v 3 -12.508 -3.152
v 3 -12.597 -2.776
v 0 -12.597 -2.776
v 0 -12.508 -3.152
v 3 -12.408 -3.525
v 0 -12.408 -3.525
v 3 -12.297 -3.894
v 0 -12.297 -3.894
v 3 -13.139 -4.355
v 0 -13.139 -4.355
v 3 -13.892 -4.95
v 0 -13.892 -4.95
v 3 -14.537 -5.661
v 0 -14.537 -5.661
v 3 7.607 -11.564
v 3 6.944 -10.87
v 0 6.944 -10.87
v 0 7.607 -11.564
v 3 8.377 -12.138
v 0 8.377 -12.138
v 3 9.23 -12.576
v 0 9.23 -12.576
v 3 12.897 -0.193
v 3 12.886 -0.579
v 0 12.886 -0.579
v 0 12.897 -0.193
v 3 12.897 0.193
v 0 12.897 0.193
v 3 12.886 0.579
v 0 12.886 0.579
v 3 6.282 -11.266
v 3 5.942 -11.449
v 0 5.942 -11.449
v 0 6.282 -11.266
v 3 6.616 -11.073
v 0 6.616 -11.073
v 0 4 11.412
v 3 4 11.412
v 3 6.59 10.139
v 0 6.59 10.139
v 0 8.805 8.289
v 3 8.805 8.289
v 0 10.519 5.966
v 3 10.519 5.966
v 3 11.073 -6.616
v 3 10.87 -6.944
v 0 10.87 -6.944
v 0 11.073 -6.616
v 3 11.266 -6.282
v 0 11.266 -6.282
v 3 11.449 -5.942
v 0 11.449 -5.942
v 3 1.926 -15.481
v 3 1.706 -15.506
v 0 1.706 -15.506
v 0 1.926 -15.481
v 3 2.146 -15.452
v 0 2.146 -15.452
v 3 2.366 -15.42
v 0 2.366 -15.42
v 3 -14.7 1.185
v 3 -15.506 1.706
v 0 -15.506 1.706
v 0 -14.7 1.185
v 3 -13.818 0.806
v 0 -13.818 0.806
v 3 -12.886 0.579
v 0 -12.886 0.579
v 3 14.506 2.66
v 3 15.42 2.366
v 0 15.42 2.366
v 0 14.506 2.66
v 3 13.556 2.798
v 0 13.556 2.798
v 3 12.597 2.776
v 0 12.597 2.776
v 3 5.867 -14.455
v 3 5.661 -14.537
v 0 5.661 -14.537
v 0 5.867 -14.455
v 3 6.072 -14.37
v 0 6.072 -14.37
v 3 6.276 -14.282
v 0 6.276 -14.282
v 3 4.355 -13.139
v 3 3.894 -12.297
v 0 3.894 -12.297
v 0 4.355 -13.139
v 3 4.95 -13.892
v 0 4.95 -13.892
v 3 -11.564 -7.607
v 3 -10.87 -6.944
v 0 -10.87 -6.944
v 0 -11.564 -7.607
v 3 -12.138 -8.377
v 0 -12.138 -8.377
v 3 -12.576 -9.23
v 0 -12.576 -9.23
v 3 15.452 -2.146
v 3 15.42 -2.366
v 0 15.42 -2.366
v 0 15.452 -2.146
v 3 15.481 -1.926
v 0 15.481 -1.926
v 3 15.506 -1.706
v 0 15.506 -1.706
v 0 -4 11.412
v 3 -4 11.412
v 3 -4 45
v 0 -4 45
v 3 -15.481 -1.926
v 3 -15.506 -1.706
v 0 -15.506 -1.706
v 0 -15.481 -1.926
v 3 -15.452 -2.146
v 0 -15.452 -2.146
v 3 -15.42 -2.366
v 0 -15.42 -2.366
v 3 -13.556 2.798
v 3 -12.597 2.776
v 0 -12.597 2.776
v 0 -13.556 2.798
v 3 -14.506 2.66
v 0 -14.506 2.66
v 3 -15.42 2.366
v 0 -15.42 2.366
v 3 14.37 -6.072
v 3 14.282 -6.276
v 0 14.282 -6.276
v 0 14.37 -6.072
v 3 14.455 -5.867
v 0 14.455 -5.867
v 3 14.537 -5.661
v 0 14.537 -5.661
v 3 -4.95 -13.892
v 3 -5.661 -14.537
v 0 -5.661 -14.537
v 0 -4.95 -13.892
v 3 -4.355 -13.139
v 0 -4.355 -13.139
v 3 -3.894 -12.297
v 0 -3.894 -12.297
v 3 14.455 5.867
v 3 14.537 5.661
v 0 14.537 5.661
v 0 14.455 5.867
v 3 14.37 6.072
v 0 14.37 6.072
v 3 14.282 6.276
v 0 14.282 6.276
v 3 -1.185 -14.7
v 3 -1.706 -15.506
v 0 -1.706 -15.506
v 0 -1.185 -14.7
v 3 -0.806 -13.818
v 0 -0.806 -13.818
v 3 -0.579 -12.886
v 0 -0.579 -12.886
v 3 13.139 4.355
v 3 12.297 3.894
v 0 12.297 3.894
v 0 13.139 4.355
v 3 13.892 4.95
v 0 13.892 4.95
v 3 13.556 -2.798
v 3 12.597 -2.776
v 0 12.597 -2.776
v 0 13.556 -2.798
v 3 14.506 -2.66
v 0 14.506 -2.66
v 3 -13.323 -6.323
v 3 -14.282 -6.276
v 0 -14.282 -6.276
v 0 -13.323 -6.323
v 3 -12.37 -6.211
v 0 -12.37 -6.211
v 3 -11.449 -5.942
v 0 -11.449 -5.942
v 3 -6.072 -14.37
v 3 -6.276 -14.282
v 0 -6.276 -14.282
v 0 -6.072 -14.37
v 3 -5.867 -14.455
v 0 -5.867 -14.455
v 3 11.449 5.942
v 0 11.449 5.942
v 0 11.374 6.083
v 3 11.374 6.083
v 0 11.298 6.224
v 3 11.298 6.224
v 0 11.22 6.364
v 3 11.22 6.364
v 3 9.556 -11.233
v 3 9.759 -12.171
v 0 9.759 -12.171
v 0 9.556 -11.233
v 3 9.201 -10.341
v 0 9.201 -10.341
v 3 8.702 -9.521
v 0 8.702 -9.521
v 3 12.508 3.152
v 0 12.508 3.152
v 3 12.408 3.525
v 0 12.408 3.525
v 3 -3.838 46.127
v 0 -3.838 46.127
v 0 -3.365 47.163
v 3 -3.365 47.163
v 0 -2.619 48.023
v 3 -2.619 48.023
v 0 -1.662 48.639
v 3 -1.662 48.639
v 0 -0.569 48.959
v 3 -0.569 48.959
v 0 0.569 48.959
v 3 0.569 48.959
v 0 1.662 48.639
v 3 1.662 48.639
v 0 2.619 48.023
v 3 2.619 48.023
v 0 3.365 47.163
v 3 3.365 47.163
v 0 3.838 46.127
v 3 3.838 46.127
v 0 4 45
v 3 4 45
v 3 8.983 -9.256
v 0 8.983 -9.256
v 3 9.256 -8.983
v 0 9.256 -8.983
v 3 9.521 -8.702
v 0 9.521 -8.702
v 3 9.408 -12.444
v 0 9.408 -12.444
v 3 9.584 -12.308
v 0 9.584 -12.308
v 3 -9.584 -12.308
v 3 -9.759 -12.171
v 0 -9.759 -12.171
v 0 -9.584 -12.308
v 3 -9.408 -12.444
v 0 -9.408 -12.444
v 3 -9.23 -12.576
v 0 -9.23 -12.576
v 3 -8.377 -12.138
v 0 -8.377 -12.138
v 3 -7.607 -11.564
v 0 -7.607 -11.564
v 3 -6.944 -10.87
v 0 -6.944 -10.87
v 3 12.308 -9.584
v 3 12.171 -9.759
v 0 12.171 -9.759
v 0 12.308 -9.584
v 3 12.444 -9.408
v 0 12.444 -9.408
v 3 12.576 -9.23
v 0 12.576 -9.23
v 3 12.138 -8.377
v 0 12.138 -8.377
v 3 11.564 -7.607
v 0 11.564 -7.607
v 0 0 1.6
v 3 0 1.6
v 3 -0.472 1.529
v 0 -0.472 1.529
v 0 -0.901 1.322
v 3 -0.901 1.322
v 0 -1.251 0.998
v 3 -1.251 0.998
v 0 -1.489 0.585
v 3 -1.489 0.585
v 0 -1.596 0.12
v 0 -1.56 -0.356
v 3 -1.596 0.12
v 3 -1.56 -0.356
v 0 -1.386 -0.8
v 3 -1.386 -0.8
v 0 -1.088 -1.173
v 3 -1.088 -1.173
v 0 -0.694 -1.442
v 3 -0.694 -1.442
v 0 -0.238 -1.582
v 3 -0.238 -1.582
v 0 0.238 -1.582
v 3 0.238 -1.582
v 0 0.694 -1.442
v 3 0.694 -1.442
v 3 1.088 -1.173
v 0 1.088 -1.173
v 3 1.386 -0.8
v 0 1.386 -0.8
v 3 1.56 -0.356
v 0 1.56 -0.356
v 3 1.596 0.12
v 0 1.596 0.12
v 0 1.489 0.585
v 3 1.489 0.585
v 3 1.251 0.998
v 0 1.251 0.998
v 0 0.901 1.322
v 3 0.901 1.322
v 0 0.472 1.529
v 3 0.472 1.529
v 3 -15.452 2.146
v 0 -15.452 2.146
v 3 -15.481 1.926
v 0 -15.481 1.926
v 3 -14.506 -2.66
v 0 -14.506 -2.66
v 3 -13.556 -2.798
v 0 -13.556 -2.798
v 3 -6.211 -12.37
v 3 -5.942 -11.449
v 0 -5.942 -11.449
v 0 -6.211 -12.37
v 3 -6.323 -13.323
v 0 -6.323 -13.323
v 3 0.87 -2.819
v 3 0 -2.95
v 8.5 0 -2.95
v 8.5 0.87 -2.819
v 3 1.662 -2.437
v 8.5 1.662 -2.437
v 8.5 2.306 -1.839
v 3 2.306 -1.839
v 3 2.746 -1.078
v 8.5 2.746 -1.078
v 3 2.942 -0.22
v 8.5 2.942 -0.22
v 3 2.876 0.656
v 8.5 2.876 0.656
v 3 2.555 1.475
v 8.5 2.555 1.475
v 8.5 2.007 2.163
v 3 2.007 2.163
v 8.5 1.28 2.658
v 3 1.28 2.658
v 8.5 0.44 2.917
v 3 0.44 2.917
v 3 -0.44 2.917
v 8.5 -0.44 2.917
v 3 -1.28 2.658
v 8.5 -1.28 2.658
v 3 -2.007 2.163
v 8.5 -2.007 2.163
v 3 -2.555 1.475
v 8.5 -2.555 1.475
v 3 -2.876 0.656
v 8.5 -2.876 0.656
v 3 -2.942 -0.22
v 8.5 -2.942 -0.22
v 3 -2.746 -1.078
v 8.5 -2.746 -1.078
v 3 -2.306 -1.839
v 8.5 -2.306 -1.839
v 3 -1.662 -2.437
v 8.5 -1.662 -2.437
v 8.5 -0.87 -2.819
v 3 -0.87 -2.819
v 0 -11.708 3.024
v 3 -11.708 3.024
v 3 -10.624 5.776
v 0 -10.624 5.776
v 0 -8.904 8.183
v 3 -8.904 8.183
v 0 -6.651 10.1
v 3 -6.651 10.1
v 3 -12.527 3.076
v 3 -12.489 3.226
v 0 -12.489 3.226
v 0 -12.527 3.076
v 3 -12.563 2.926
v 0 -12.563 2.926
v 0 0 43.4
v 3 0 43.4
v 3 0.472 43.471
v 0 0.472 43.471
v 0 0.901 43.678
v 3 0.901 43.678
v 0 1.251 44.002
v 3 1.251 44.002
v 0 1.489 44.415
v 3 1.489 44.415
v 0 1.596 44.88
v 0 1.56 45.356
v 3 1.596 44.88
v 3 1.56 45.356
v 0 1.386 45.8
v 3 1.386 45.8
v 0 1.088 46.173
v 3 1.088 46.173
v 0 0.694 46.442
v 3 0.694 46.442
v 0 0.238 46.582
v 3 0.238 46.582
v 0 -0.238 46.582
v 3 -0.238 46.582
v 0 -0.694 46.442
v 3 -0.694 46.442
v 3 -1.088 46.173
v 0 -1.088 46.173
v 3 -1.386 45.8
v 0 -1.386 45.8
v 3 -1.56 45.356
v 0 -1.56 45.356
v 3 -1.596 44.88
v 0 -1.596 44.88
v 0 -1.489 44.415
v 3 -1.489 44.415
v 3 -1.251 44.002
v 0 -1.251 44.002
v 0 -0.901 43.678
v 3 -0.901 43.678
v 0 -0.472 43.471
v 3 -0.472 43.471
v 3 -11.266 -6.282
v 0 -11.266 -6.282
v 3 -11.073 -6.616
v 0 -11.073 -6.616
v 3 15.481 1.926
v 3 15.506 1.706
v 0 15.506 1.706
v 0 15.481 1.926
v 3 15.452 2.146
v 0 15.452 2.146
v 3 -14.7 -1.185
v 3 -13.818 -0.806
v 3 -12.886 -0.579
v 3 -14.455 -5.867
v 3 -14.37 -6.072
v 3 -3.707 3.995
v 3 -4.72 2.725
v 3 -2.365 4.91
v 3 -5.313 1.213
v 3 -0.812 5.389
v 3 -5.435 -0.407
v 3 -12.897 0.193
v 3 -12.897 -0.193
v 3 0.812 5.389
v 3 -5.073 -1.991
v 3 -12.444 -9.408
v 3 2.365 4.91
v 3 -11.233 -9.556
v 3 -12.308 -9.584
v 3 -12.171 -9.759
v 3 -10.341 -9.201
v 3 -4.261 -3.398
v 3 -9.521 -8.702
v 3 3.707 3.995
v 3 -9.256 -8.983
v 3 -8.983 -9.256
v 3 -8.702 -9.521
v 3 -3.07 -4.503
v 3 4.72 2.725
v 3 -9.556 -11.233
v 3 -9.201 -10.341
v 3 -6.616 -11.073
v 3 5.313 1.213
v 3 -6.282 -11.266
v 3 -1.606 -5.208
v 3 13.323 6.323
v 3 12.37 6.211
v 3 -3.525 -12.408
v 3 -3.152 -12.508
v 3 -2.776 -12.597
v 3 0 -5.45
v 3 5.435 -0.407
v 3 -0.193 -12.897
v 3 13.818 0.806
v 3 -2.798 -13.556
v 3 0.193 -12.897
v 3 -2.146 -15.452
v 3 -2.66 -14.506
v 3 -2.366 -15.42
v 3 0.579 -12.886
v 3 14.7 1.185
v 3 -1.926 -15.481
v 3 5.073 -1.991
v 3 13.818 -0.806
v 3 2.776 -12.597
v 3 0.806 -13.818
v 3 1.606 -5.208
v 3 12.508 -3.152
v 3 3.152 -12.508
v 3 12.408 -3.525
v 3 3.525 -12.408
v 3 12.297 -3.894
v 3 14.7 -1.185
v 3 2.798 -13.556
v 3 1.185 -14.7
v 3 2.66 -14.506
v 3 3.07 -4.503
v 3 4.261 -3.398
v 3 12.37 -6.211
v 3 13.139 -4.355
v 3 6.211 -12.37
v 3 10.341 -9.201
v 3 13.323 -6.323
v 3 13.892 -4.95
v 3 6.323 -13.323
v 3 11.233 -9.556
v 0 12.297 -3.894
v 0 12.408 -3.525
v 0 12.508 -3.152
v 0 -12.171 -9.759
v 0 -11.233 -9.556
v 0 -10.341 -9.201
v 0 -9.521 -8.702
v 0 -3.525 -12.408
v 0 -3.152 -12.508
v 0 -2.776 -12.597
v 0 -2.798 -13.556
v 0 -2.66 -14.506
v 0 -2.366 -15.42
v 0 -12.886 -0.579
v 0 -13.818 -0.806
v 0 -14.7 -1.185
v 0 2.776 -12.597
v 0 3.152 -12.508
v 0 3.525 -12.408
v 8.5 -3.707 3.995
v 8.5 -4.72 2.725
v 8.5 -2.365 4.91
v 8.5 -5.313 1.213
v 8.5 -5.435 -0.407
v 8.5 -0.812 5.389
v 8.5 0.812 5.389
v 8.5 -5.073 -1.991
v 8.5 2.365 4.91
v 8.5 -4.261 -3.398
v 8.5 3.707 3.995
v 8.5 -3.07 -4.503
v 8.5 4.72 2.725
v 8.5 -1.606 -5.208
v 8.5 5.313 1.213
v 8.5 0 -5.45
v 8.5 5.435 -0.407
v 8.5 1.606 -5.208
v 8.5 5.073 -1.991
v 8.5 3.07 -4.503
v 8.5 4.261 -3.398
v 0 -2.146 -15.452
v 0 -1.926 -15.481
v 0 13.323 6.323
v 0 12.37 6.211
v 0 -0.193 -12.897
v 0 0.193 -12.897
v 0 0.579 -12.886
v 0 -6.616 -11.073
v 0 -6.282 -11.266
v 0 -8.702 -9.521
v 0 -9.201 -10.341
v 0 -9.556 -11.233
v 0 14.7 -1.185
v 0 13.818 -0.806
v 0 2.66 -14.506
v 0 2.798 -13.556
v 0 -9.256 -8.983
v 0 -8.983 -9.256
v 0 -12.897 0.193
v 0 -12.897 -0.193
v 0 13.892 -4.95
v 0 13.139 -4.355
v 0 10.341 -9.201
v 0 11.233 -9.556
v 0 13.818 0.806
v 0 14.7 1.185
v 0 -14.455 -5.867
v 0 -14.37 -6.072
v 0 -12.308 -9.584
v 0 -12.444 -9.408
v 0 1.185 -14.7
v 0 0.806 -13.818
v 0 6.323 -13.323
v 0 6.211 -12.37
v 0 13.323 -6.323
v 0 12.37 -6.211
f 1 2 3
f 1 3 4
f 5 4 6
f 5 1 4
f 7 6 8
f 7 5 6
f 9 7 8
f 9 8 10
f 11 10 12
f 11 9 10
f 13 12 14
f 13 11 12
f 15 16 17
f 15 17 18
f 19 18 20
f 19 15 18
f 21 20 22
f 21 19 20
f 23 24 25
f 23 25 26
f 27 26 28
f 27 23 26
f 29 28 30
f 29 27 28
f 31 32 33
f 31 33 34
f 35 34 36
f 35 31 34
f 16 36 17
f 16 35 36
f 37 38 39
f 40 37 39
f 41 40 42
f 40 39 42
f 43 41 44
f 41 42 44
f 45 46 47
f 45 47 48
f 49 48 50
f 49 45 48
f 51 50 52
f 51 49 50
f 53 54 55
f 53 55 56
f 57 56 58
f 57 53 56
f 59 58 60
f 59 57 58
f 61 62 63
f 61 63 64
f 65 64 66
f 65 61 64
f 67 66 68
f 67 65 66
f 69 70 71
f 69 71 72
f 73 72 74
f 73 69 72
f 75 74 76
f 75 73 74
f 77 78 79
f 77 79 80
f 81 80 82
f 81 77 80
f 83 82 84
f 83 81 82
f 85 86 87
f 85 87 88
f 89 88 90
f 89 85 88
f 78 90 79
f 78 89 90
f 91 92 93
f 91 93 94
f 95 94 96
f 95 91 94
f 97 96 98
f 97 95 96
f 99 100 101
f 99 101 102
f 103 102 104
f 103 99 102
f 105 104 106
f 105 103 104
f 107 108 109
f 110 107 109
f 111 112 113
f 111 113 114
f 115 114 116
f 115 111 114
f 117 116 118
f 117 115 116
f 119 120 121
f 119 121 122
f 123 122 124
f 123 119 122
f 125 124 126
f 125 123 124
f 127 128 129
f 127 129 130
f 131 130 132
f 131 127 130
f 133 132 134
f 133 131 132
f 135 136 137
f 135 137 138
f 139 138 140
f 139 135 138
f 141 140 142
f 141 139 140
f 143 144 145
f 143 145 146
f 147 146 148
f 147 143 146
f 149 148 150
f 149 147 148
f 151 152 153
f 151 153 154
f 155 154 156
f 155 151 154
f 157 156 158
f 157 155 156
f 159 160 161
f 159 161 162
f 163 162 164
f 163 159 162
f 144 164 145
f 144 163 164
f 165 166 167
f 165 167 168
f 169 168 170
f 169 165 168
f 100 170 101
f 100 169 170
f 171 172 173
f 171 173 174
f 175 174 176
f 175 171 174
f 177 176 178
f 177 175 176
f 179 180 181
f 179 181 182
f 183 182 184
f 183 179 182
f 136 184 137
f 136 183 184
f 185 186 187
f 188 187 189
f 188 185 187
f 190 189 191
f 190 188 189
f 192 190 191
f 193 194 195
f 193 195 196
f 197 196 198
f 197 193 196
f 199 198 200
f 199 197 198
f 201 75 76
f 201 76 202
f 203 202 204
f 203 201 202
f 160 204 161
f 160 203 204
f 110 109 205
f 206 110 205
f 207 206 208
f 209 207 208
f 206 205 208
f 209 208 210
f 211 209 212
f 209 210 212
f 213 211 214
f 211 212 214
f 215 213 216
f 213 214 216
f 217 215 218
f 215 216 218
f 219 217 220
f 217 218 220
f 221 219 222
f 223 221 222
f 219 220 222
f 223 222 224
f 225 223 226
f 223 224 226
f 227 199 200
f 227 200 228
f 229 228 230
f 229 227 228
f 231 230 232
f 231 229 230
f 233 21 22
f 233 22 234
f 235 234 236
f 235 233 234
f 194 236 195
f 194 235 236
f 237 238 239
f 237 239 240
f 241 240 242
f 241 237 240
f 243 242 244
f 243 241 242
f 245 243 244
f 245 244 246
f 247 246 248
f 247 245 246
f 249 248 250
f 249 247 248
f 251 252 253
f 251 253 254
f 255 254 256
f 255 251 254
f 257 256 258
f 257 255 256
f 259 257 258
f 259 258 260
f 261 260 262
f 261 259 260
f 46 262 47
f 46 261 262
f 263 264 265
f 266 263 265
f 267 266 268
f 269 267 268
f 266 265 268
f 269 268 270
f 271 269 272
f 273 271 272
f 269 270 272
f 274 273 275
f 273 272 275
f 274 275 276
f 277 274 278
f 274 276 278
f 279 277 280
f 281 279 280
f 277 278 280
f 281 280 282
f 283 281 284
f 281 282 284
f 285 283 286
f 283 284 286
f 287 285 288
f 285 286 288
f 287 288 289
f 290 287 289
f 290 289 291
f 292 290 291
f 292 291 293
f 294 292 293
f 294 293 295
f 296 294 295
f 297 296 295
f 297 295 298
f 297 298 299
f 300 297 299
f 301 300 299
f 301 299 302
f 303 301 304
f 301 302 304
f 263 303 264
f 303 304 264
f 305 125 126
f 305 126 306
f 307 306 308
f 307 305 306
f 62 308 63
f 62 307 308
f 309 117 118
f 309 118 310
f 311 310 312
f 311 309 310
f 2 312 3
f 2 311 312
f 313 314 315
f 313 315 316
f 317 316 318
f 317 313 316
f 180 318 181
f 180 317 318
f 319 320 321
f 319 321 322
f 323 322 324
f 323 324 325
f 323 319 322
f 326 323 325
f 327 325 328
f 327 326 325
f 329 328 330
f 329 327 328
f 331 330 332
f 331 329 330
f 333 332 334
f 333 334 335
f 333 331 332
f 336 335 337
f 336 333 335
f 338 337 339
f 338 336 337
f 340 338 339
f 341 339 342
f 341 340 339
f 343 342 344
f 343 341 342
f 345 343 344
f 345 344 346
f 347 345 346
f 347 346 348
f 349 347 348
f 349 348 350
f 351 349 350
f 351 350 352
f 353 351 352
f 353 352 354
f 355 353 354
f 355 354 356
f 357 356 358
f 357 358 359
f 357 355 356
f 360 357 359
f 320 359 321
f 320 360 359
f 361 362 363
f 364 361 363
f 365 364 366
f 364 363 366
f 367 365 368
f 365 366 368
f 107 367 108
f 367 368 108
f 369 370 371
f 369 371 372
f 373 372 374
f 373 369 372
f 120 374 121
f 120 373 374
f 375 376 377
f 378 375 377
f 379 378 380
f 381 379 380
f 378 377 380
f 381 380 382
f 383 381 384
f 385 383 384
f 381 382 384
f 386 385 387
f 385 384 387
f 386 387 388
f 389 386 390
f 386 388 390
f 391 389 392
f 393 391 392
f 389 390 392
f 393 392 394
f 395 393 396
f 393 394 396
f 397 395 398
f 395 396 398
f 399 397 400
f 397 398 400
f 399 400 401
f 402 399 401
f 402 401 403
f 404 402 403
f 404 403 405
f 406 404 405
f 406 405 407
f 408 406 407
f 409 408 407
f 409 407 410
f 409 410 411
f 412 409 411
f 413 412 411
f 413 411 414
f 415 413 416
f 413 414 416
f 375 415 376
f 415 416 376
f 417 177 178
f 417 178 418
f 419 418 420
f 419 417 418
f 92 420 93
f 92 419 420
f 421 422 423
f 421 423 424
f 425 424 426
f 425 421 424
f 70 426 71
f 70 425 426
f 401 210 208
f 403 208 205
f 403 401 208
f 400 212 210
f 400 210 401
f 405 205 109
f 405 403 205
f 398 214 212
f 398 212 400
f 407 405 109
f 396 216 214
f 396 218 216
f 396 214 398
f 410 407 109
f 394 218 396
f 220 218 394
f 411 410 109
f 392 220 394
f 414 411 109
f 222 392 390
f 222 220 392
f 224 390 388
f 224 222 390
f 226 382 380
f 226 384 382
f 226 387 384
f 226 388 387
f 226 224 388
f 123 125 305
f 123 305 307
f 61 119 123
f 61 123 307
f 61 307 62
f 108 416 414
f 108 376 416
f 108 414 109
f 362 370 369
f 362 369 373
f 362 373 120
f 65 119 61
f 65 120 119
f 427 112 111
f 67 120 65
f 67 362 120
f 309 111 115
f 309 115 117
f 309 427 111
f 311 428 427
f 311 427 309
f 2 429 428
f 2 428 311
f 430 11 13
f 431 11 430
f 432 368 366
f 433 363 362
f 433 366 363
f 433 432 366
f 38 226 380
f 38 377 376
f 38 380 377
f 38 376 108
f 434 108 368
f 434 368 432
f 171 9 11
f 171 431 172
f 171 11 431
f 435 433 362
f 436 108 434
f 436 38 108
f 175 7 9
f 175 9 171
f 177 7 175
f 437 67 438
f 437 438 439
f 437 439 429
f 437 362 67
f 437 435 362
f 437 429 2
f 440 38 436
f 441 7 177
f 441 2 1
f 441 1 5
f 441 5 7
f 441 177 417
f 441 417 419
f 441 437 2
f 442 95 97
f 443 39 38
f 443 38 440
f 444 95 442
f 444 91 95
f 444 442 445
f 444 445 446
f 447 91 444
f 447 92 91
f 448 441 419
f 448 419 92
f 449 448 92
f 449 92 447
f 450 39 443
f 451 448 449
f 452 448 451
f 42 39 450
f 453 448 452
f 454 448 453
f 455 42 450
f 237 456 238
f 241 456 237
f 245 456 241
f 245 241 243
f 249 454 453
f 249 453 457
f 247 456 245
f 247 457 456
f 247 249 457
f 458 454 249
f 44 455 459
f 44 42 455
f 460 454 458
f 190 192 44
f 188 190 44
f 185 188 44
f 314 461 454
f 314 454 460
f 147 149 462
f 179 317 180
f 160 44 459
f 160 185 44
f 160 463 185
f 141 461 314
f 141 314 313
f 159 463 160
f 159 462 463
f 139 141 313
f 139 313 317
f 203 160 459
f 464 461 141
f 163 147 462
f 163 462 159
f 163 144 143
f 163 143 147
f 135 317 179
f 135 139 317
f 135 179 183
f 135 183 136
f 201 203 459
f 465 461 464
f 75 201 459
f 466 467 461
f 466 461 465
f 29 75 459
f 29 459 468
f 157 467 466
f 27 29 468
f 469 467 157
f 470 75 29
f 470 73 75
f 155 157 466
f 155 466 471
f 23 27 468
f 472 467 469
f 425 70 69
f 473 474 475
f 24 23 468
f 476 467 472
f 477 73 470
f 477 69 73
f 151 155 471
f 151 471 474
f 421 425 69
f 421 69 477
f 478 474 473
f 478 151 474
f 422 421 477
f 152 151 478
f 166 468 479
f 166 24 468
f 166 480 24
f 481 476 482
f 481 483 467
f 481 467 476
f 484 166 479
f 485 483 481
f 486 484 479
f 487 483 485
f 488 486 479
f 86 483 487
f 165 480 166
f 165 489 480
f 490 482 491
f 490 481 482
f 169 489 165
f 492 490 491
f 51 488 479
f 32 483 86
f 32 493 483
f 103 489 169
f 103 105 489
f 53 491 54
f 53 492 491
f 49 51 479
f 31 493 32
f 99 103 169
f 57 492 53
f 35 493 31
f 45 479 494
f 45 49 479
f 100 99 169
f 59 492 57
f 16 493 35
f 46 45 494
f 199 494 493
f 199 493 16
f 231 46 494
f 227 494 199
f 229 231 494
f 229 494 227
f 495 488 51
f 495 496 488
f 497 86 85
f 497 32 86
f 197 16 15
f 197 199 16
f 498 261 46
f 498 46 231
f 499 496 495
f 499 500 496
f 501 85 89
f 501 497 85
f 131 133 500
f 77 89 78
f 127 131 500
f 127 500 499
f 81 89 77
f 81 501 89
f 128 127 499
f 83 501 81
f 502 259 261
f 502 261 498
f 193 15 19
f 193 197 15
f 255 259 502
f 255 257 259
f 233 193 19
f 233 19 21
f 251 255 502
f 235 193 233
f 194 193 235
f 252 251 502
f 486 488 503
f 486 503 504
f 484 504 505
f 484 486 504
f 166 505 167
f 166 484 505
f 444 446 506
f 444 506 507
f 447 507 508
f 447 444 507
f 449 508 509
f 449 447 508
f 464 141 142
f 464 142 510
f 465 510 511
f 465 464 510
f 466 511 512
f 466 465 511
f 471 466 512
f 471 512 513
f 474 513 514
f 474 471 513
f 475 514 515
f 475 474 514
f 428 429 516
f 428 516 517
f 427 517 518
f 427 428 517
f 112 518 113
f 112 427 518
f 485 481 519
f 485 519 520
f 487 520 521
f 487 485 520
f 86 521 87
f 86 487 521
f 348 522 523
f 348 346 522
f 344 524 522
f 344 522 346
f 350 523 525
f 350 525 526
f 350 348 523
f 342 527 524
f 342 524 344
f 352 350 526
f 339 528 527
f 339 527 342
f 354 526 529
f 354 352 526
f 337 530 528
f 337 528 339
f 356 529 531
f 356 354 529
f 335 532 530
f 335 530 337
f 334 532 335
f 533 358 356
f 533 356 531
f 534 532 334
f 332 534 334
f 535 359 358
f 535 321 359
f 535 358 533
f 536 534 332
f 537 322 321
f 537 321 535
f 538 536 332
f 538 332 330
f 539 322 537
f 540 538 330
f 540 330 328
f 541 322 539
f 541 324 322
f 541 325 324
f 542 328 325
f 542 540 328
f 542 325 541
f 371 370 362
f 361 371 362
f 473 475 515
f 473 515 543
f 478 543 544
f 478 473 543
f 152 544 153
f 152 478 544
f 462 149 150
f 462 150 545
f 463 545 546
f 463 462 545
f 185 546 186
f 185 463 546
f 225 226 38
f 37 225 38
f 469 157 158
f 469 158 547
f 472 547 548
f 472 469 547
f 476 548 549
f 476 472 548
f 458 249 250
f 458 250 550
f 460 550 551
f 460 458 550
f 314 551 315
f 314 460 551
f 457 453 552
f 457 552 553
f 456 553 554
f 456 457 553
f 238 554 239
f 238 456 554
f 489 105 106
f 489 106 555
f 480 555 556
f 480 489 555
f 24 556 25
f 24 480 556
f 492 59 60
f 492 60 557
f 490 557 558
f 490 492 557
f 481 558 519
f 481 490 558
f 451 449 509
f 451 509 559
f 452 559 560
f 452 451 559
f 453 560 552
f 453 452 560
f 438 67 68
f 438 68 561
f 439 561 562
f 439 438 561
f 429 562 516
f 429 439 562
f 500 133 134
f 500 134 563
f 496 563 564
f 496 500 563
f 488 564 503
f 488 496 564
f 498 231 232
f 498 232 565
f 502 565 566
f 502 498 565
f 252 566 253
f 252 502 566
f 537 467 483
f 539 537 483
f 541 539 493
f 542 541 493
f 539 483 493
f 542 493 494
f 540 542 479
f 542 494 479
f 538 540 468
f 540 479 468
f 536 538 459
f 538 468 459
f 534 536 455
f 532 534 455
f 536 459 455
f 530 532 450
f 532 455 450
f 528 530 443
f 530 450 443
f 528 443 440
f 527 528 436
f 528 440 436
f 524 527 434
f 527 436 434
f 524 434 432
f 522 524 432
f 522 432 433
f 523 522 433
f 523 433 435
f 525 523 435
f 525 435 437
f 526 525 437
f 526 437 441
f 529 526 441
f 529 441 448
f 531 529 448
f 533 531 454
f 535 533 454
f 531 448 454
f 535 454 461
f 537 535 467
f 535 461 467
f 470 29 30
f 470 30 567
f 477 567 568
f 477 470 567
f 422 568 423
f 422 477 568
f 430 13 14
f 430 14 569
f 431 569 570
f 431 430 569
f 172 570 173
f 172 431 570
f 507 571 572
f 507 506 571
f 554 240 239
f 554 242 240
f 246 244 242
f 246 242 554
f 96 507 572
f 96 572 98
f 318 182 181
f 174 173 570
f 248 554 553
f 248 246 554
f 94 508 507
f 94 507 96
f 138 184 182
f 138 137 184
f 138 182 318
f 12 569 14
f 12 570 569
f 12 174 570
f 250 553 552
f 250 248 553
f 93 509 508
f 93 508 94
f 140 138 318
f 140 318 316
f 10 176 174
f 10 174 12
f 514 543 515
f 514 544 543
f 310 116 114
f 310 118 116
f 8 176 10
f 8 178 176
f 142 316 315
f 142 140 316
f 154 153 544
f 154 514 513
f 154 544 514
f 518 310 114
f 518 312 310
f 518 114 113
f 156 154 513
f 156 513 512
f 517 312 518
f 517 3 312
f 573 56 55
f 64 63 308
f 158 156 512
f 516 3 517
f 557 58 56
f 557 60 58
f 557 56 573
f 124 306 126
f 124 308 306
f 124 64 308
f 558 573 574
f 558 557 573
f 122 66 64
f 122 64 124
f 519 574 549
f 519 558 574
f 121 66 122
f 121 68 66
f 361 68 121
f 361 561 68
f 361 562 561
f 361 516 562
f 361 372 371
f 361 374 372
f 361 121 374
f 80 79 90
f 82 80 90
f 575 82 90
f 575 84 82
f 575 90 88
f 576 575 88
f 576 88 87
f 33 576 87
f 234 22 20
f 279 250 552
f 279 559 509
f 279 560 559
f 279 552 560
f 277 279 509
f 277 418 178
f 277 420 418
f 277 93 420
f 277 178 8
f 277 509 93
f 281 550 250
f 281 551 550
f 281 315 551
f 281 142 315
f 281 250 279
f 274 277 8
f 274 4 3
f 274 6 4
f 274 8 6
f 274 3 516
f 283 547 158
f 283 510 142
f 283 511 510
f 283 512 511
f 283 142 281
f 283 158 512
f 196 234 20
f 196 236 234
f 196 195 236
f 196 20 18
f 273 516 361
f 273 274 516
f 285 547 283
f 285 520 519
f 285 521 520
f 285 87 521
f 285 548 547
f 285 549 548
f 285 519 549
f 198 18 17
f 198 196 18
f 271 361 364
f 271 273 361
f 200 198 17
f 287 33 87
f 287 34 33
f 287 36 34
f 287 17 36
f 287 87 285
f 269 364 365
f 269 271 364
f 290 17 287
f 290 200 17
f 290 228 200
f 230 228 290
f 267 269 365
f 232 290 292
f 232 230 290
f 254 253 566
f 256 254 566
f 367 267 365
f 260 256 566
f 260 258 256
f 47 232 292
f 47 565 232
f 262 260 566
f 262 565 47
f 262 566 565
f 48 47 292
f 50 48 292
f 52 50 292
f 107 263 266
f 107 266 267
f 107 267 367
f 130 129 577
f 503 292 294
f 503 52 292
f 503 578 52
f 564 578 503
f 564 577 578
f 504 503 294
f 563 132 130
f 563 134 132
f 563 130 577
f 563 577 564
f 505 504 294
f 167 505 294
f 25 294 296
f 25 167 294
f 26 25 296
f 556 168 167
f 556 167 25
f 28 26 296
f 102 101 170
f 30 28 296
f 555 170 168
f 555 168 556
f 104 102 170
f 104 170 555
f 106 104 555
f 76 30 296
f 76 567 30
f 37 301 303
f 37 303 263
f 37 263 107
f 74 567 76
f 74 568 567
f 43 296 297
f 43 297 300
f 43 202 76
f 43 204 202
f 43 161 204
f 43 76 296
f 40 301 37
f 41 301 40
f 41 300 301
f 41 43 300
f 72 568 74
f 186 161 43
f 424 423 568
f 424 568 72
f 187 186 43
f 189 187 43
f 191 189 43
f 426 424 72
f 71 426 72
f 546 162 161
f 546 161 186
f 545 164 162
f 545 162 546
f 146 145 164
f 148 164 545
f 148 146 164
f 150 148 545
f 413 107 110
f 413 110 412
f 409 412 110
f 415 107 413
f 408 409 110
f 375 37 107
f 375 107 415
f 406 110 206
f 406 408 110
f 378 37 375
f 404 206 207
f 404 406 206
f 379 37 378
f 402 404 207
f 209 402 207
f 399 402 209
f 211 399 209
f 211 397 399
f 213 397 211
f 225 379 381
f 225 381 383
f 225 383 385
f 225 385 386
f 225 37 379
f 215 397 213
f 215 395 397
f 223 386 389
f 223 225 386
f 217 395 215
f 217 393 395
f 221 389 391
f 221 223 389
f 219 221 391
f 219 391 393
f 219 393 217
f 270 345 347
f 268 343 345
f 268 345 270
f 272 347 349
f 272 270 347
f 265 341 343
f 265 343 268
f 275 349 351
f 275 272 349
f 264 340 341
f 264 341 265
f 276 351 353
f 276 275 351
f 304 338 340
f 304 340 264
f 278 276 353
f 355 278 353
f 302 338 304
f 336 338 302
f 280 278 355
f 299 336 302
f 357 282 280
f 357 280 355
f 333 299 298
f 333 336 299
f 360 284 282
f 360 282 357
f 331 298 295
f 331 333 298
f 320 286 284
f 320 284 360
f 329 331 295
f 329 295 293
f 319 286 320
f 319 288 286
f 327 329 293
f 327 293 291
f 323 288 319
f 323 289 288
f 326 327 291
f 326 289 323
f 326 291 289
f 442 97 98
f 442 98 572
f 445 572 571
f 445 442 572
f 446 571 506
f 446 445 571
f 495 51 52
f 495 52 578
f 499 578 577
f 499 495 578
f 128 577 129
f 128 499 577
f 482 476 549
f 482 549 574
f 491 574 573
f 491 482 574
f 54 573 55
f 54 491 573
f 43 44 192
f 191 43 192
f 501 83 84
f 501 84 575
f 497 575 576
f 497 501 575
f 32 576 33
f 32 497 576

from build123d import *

# Parameters (mm, degrees)
SKETCH1_R           = 1.6
BOSS_EXTRUDE1_DEPTH = 3
SKETCH2_R           = 1.6
SKETCH2_R_2         = 1.75
BOSS_EXTRUDE2_DEPTH = 3
CUT_EXTRUDE1_DEPTH  = 10
SKETCH4_R           = 5.45
SKETCH4_R_2         = 2.95
BOSS_EXTRUDE3_DEPTH = 5.5


with BuildPart() as part:
    # Sketch1 → Boss-Extrude1 (new body)
    with BuildSketch(Plane(origin=(3, 0, 0), x_dir=(0, 0, -1), z_dir=(1, 0, 0))):
        with BuildLine():
            ThreePointArc((-15.506469218, 1.705699967), (-14.267058736, 0.977515599), (-12.885936189, 0.578903848))
            ThreePointArc((-12.885936189, 0.578903848), (-12.898933333, 0), (-12.885936189, -0.578903848))
            ThreePointArc((-12.885936189, -0.578903848), (-14.267058736, -0.977515599), (-15.506469218, -1.705699967))
            ThreePointArc((-15.506469218, -1.705699967), (-15.466539837, -2.036208599), (-15.419566729, -2.365789906))
            ThreePointArc((-15.419566729, -2.365789906), (-14.033920152, -2.748378956), (-12.596689902, -2.775947522))
            ThreePointArc((-12.596689902, -2.775947522), (-12.459412838, -3.338489608), (-12.29702722, -3.894303878))
            ThreePointArc((-12.29702722, -3.894303878), (-13.527920844, -4.636794081), (-14.536631456, -5.660949206))
            ThreePointArc((-14.536631456, -5.660949206), (-14.412520707, -5.969861545), (-14.281846249, -6.276055107))
            ThreePointArc((-14.281846249, -6.276055107), (-12.844393102, -6.286976026), (-11.449000016, -5.941622656))
            ThreePointArc((-11.449000016, -5.941622656), (-11.170803948, -6.449466667), (-10.870096167, -6.944313534))
            ThreePointArc((-10.870096167, -6.944313534), (-11.866877503, -7.98008271), (-12.576146283, -9.230414112))
            ThreePointArc((-12.576146283, -9.230414112), (-12.376312109, -9.496678293), (-12.17084155, -9.758617524))
            ThreePointArc((-12.17084155, -9.758617524), (-10.779541889, -9.397126071), (-9.521079698, -8.702386024))
            ThreePointArc((-9.521079698, -8.702386024), (-9.12092323, -9.12092323), (-8.702386024, -9.521079698))
            ThreePointArc((-8.702386024, -9.521079698), (-9.397126071, -10.779541889), (-9.758617524, -12.17084155))
            ThreePointArc((-9.758617524, -12.17084155), (-9.496678293, -12.376312109), (-9.230414112, -12.576146283))
            ThreePointArc((-9.230414112, -12.576146283), (-7.98008271, -11.866877503), (-6.944313534, -10.870096167))
            ThreePointArc((-6.944313534, -10.870096167), (-6.449466667, -11.170803948), (-5.941622656, -11.449000016))
            ThreePointArc((-5.941622656, -11.449000016), (-6.286976026, -12.844393102), (-6.276055107, -14.281846249))
            ThreePointArc((-6.276055107, -14.281846249), (-5.969861545, -14.412520707), (-5.660949206, -14.536631456))
            ThreePointArc((-5.660949206, -14.536631456), (-4.636794081, -13.527920844), (-3.894303878, -12.29702722))
            ThreePointArc((-3.894303878, -12.29702722), (-3.338489608, -12.459412838), (-2.775947522, -12.596689902))
            ThreePointArc((-2.775947522, -12.596689902), (-2.748378956, -14.033920152), (-2.365789906, -15.419566729))
            ThreePointArc((-2.365789906, -15.419566729), (-2.036208599, -15.466539837), (-1.705699967, -15.506469218))
            ThreePointArc((-1.705699967, -15.506469218), (-0.977515599, -14.267058736), (-0.578903848, -12.885936189))
            ThreePointArc((-0.578903848, -12.885936189), (0, -12.898933333), (0.578903848, -12.885936189))
            ThreePointArc((0.578903848, -12.885936189), (0.977515599, -14.267058736), (1.705699967, -15.506469218))
            ThreePointArc((1.705699967, -15.506469218), (2.036208599, -15.466539837), (2.365789906, -15.419566729))
            ThreePointArc((2.365789906, -15.419566729), (2.748378956, -14.033920152), (2.775947522, -12.596689902))
            ThreePointArc((2.775947522, -12.596689902), (3.338489608, -12.459412838), (3.894303878, -12.29702722))
            ThreePointArc((3.894303878, -12.29702722), (4.636794081, -13.527920844), (5.660949206, -14.536631456))
            ThreePointArc((5.660949206, -14.536631456), (5.969861545, -14.412520707), (6.276055107, -14.281846249))
            ThreePointArc((6.276055107, -14.281846249), (6.286976026, -12.844393102), (5.941622656, -11.449000016))
            ThreePointArc((5.941622656, -11.449000016), (6.449466667, -11.170803948), (6.944313534, -10.870096167))
            ThreePointArc((6.944313534, -10.870096167), (7.98008271, -11.866877503), (9.230414112, -12.576146283))
            ThreePointArc((9.230414112, -12.576146283), (9.496678293, -12.376312109), (9.758617524, -12.17084155))
            ThreePointArc((9.758617524, -12.17084155), (9.397126071, -10.779541889), (8.702386024, -9.521079698))
            ThreePointArc((8.702386024, -9.521079698), (9.12092323, -9.12092323), (9.521079698, -8.702386024))
            ThreePointArc((9.521079698, -8.702386024), (10.779541889, -9.397126071), (12.17084155, -9.758617524))
            ThreePointArc((12.17084155, -9.758617524), (12.376312109, -9.496678293), (12.576146283, -9.230414112))
            ThreePointArc((12.576146283, -9.230414112), (11.866877503, -7.98008271), (10.870096167, -6.944313534))
            ThreePointArc((10.870096167, -6.944313534), (11.170803948, -6.449466667), (11.449000016, -5.941622656))
            ThreePointArc((11.449000016, -5.941622656), (12.844393102, -6.286976026), (14.281846249, -6.276055107))
            ThreePointArc((14.281846249, -6.276055107), (14.412520707, -5.969861545), (14.536631456, -5.660949206))
            ThreePointArc((14.536631456, -5.660949206), (13.527920844, -4.636794081), (12.29702722, -3.894303878))
            ThreePointArc((12.29702722, -3.894303878), (12.459412838, -3.338489608), (12.596689902, -2.775947522))
            ThreePointArc((12.596689902, -2.775947522), (14.033920152, -2.748378956), (15.419566729, -2.365789906))
            ThreePointArc((15.419566729, -2.365789906), (15.466539837, -2.036208599), (15.506469218, -1.705699967))
            ThreePointArc((15.506469218, -1.705699967), (14.267058736, -0.977515599), (12.885936189, -0.578903848))
            ThreePointArc((12.885936189, -0.578903848), (12.898933333, 0), (12.885936189, 0.578903848))
            ThreePointArc((12.885936189, 0.578903848), (14.267058736, 0.977515599), (15.506469218, 1.705699967))
            ThreePointArc((15.506469218, 1.705699967), (15.466539837, 2.036208599), (15.419566729, 2.365789906))
            ThreePointArc((15.419566729, 2.365789906), (14.033920152, 2.748378956), (12.596689902, 2.775947522))
            ThreePointArc((12.596689902, 2.775947522), (12.459412838, 3.338489608), (12.29702722, 3.894303878))
            ThreePointArc((12.29702722, 3.894303878), (13.527920844, 4.636794081), (14.536631456, 5.660949206))
            ThreePointArc((14.536631456, 5.660949206), (14.412520707, 5.969861545), (14.281846249, 6.276055107))
            ThreePointArc((14.281846249, 6.276055107), (12.844393102, 6.286976026), (11.449000016, 5.941622656))
            ThreePointArc((11.449000016, 5.941622656), (11.170803948, 6.449466667), (10.870096167, 6.944313534))
            ThreePointArc((10.870096167, 6.944313534), (11.866877503, 7.98008271), (12.576146283, 9.230414112))
            ThreePointArc((12.576146283, 9.230414112), (12.376312109, 9.496678293), (12.17084155, 9.758617524))
            ThreePointArc((12.17084155, 9.758617524), (10.779541889, 9.397126071), (9.521079698, 8.702386024))
            ThreePointArc((9.521079698, 8.702386024), (9.12092323, 9.12092323), (8.702386024, 9.521079698))
            ThreePointArc((8.702386024, 9.521079698), (9.397126071, 10.779541889), (9.758617524, 12.17084155))
            ThreePointArc((9.758617524, 12.17084155), (9.496678293, 12.376312109), (9.230414112, 12.576146283))
            ThreePointArc((9.230414112, 12.576146283), (7.98008271, 11.866877503), (6.944313534, 10.870096167))
            ThreePointArc((6.944313534, 10.870096167), (6.449466667, 11.170803948), (5.941622656, 11.449000016))
            ThreePointArc((5.941622656, 11.449000016), (6.286976026, 12.844393102), (6.276055107, 14.281846249))
            ThreePointArc((6.276055107, 14.281846249), (5.969861545, 14.412520707), (5.660949206, 14.536631456))
            ThreePointArc((5.660949206, 14.536631456), (4.636794081, 13.527920844), (3.894303878, 12.29702722))
            ThreePointArc((3.894303878, 12.29702722), (3.338489608, 12.459412838), (2.775947522, 12.596689902))
            ThreePointArc((2.775947522, 12.596689902), (2.748378956, 14.033920152), (2.365789906, 15.419566729))
            ThreePointArc((2.365789906, 15.419566729), (2.036208599, 15.466539837), (1.705699967, 15.506469218))
            ThreePointArc((1.705699967, 15.506469218), (0.977515599, 14.267058736), (0.578903848, 12.885936189))
            ThreePointArc((0.578903848, 12.885936189), (0, 12.898933333), (-0.578903848, 12.885936189))
            ThreePointArc((-0.578903848, 12.885936189), (-0.977515599, 14.267058736), (-1.705699967, 15.506469218))
            ThreePointArc((-1.705699967, 15.506469218), (-2.036208599, 15.466539837), (-2.365789906, 15.419566729))
            ThreePointArc((-2.365789906, 15.419566729), (-2.748378956, 14.033920152), (-2.775947522, 12.596689902))
            ThreePointArc((-2.775947522, 12.596689902), (-3.338489608, 12.459412838), (-3.894303878, 12.29702722))
            ThreePointArc((-3.894303878, 12.29702722), (-4.636794081, 13.527920844), (-5.660949206, 14.536631456))
            ThreePointArc((-5.660949206, 14.536631456), (-5.969861545, 14.412520707), (-6.276055107, 14.281846249))
            ThreePointArc((-6.276055107, 14.281846249), (-6.286976026, 12.844393102), (-5.941622656, 11.449000016))
            ThreePointArc((-5.941622656, 11.449000016), (-6.449466667, 11.170803948), (-6.944313534, 10.870096167))
            ThreePointArc((-6.944313534, 10.870096167), (-7.98008271, 11.866877503), (-9.230414112, 12.576146283))
            ThreePointArc((-9.230414112, 12.576146283), (-9.496678293, 12.376312109), (-9.758617524, 12.17084155))
            ThreePointArc((-9.758617524, 12.17084155), (-9.397126071, 10.779541889), (-8.702386024, 9.521079698))
            ThreePointArc((-8.702386024, 9.521079698), (-9.12092323, 9.12092323), (-9.521079698, 8.702386024))
            ThreePointArc((-9.521079698, 8.702386024), (-10.779541889, 9.397126071), (-12.17084155, 9.758617524))
            ThreePointArc((-12.17084155, 9.758617524), (-12.376312109, 9.496678293), (-12.576146283, 9.230414112))
            ThreePointArc((-12.576146283, 9.230414112), (-11.866877503, 7.98008271), (-10.870096167, 6.944313534))
            ThreePointArc((-10.870096167, 6.944313534), (-11.170803948, 6.449466667), (-11.449000016, 5.941622656))
            ThreePointArc((-11.449000016, 5.941622656), (-12.844393102, 6.286976026), (-14.281846249, 6.276055107))
            ThreePointArc((-14.281846249, 6.276055107), (-14.412520707, 5.969861545), (-14.536631456, 5.660949206))
            ThreePointArc((-14.536631456, 5.660949206), (-13.527920844, 4.636794081), (-12.29702722, 3.894303878))
            ThreePointArc((-12.29702722, 3.894303878), (-12.459412838, 3.338489608), (-12.596689902, 2.775947522))
            ThreePointArc((-12.596689902, 2.775947522), (-14.033920152, 2.748378956), (-15.419566729, 2.365789906))
            ThreePointArc((-15.419566729, 2.365789906), (-15.466539837, 2.036208599), (-15.506469218, 1.705699967))
        make_face()
        with Locations(Location((0, 0, 0), (0, 0, 180))):
            Circle(SKETCH1_R, mode=Mode.SUBTRACT)
    extrude(amount=-BOSS_EXTRUDE1_DEPTH)

    # Sketch2 → Boss-Extrude2 (add)
    with BuildSketch(Plane(origin=(3, 0, 0), x_dir=(0, 0, -1), z_dir=(1, 0, 0))):
        with BuildLine():
            Line((0, -4), (-45, -4))
            ThreePointArc((-45, -4), (-49, 0), (-45, 4))
            Line((-45, 4), (0, 4))
            ThreePointArc((0, 4), (4, 0), (0, -4))
        make_face()
        with Locations((-45, 0)):
            Circle(SKETCH2_R, mode=Mode.SUBTRACT)
        Circle(SKETCH2_R_2, mode=Mode.SUBTRACT)
    extrude(amount=-BOSS_EXTRUDE2_DEPTH)

    # Sketch3 → Cut-Extrude1 (cut)
    with BuildSketch(Plane(origin=(3, 0, 0), x_dir=(0, 0, -1), z_dir=(1, 0, 0))):
        with BuildLine():
            Line((-12.521979493, 4), (-11.412037617, 4))
            ThreePointArc((-11.412037617, 4), (-9.280192177, 7.753233888), (-5.965971484, 10.51863997))
            Line((-5.965971484, 10.51863997), (-6.363702916, 11.219882635))
            ThreePointArc((-6.363702916, 11.219882635), (-6.656306265, 11.048803919), (-6.944313534, 10.870096167))
            ThreePointArc((-6.944313534, 10.870096167), (-7.98008271, 11.866877503), (-9.230414112, 12.576146283))
            ThreePointArc((-9.230414112, 12.576146283), (-9.496678293, 12.376312109), (-9.758617524, 12.17084155))
            ThreePointArc((-9.758617524, 12.17084155), (-9.397126071, 10.779541889), (-8.702386024, 9.521079698))
            ThreePointArc((-8.702386024, 9.521079698), (-9.12092323, 9.12092323), (-9.521079698, 8.702386024))
            ThreePointArc((-9.521079698, 8.702386024), (-10.779541889, 9.397126071), (-12.17084155, 9.758617524))
            ThreePointArc((-12.17084155, 9.758617524), (-12.376312109, 9.496678293), (-12.576146283, 9.230414112))
            ThreePointArc((-12.576146283, 9.230414112), (-11.866877503, 7.98008271), (-10.870096167, 6.944313534))
            ThreePointArc((-10.870096167, 6.944313534), (-11.170803948, 6.449466667), (-11.449000016, 5.941622656))
            ThreePointArc((-11.449000016, 5.941622656), (-12.844393102, 6.286976026), (-14.281846249, 6.276055107))
            ThreePointArc((-14.281846249, 6.276055107), (-14.412520707, 5.969861545), (-14.536631456, 5.660949206))
            ThreePointArc((-14.536631456, 5.660949206), (-13.624661268, 4.714812585), (-12.521979493, 4))
        make_face()
        with BuildLine():
            ThreePointArc((-3.024257119, -11.708478613), (-8.182714223, -8.903807641), (-11.412037617, -4))
            Line((-11.412037617, -4), (-12.521979493, -4))
            ThreePointArc((-12.521979493, -4), (-13.624661268, -4.714812585), (-14.536631456, -5.660949206))
            ThreePointArc((-14.536631456, -5.660949206), (-14.412520707, -5.969861545), (-14.281846249, -6.276055107))
            ThreePointArc((-14.281846249, -6.276055107), (-12.844393102, -6.286976026), (-11.449000016, -5.941622656))
            ThreePointArc((-11.449000016, -5.941622656), (-11.170803948, -6.449466667), (-10.870096167, -6.944313534))
            ThreePointArc((-10.870096167, -6.944313534), (-11.866877503, -7.98008271), (-12.576146283, -9.230414112))
            ThreePointArc((-12.576146283, -9.230414112), (-12.376312109, -9.496678293), (-12.17084155, -9.758617524))
            ThreePointArc((-12.17084155, -9.758617524), (-10.779541889, -9.397126071), (-9.521079698, -8.702386024))
            ThreePointArc((-9.521079698, -8.702386024), (-9.12092323, -9.12092323), (-8.702386024, -9.521079698))
            ThreePointArc((-8.702386024, -9.521079698), (-9.397126071, -10.779541889), (-9.758617524, -12.17084155))
            ThreePointArc((-9.758617524, -12.17084155), (-9.496678293, -12.376312109), (-9.230414112, -12.576146283))
            ThreePointArc((-9.230414112, -12.576146283), (-7.98008271, -11.866877503), (-6.944313534, -10.870096167))
            ThreePointArc((-6.944313534, -10.870096167), (-6.449466667, -11.170803948), (-5.941622656, -11.449000016))
            ThreePointArc((-5.941622656, -11.449000016), (-6.286976026, -12.844393102), (-6.276055107, -14.281846249))
            ThreePointArc((-6.276055107, -14.281846249), (-5.969861545, -14.412520707), (-5.660949206, -14.536631456))
            ThreePointArc((-5.660949206, -14.536631456), (-4.636794081, -13.527920844), (-3.894303878, -12.29702722))
            ThreePointArc((-3.894303878, -12.29702722), (-3.561383408, -12.397541263), (-3.22587426, -12.489043854))
            Line((-3.22587426, -12.489043854), (-3.024257119, -11.708478613))
        make_face()
    extrude(amount=-CUT_EXTRUDE1_DEPTH, mode=Mode.SUBTRACT)

    # Sketch4 → Boss-Extrude3 (add)
    with BuildSketch(Plane(origin=(3, 0, 0), x_dir=(0, 0, -1), z_dir=(1, 0, 0))):
        Circle(SKETCH4_R)
        Circle(SKETCH4_R_2, mode=Mode.SUBTRACT)
    extrude(amount=BOSS_EXTRUDE3_DEPTH)


solid = part.part
